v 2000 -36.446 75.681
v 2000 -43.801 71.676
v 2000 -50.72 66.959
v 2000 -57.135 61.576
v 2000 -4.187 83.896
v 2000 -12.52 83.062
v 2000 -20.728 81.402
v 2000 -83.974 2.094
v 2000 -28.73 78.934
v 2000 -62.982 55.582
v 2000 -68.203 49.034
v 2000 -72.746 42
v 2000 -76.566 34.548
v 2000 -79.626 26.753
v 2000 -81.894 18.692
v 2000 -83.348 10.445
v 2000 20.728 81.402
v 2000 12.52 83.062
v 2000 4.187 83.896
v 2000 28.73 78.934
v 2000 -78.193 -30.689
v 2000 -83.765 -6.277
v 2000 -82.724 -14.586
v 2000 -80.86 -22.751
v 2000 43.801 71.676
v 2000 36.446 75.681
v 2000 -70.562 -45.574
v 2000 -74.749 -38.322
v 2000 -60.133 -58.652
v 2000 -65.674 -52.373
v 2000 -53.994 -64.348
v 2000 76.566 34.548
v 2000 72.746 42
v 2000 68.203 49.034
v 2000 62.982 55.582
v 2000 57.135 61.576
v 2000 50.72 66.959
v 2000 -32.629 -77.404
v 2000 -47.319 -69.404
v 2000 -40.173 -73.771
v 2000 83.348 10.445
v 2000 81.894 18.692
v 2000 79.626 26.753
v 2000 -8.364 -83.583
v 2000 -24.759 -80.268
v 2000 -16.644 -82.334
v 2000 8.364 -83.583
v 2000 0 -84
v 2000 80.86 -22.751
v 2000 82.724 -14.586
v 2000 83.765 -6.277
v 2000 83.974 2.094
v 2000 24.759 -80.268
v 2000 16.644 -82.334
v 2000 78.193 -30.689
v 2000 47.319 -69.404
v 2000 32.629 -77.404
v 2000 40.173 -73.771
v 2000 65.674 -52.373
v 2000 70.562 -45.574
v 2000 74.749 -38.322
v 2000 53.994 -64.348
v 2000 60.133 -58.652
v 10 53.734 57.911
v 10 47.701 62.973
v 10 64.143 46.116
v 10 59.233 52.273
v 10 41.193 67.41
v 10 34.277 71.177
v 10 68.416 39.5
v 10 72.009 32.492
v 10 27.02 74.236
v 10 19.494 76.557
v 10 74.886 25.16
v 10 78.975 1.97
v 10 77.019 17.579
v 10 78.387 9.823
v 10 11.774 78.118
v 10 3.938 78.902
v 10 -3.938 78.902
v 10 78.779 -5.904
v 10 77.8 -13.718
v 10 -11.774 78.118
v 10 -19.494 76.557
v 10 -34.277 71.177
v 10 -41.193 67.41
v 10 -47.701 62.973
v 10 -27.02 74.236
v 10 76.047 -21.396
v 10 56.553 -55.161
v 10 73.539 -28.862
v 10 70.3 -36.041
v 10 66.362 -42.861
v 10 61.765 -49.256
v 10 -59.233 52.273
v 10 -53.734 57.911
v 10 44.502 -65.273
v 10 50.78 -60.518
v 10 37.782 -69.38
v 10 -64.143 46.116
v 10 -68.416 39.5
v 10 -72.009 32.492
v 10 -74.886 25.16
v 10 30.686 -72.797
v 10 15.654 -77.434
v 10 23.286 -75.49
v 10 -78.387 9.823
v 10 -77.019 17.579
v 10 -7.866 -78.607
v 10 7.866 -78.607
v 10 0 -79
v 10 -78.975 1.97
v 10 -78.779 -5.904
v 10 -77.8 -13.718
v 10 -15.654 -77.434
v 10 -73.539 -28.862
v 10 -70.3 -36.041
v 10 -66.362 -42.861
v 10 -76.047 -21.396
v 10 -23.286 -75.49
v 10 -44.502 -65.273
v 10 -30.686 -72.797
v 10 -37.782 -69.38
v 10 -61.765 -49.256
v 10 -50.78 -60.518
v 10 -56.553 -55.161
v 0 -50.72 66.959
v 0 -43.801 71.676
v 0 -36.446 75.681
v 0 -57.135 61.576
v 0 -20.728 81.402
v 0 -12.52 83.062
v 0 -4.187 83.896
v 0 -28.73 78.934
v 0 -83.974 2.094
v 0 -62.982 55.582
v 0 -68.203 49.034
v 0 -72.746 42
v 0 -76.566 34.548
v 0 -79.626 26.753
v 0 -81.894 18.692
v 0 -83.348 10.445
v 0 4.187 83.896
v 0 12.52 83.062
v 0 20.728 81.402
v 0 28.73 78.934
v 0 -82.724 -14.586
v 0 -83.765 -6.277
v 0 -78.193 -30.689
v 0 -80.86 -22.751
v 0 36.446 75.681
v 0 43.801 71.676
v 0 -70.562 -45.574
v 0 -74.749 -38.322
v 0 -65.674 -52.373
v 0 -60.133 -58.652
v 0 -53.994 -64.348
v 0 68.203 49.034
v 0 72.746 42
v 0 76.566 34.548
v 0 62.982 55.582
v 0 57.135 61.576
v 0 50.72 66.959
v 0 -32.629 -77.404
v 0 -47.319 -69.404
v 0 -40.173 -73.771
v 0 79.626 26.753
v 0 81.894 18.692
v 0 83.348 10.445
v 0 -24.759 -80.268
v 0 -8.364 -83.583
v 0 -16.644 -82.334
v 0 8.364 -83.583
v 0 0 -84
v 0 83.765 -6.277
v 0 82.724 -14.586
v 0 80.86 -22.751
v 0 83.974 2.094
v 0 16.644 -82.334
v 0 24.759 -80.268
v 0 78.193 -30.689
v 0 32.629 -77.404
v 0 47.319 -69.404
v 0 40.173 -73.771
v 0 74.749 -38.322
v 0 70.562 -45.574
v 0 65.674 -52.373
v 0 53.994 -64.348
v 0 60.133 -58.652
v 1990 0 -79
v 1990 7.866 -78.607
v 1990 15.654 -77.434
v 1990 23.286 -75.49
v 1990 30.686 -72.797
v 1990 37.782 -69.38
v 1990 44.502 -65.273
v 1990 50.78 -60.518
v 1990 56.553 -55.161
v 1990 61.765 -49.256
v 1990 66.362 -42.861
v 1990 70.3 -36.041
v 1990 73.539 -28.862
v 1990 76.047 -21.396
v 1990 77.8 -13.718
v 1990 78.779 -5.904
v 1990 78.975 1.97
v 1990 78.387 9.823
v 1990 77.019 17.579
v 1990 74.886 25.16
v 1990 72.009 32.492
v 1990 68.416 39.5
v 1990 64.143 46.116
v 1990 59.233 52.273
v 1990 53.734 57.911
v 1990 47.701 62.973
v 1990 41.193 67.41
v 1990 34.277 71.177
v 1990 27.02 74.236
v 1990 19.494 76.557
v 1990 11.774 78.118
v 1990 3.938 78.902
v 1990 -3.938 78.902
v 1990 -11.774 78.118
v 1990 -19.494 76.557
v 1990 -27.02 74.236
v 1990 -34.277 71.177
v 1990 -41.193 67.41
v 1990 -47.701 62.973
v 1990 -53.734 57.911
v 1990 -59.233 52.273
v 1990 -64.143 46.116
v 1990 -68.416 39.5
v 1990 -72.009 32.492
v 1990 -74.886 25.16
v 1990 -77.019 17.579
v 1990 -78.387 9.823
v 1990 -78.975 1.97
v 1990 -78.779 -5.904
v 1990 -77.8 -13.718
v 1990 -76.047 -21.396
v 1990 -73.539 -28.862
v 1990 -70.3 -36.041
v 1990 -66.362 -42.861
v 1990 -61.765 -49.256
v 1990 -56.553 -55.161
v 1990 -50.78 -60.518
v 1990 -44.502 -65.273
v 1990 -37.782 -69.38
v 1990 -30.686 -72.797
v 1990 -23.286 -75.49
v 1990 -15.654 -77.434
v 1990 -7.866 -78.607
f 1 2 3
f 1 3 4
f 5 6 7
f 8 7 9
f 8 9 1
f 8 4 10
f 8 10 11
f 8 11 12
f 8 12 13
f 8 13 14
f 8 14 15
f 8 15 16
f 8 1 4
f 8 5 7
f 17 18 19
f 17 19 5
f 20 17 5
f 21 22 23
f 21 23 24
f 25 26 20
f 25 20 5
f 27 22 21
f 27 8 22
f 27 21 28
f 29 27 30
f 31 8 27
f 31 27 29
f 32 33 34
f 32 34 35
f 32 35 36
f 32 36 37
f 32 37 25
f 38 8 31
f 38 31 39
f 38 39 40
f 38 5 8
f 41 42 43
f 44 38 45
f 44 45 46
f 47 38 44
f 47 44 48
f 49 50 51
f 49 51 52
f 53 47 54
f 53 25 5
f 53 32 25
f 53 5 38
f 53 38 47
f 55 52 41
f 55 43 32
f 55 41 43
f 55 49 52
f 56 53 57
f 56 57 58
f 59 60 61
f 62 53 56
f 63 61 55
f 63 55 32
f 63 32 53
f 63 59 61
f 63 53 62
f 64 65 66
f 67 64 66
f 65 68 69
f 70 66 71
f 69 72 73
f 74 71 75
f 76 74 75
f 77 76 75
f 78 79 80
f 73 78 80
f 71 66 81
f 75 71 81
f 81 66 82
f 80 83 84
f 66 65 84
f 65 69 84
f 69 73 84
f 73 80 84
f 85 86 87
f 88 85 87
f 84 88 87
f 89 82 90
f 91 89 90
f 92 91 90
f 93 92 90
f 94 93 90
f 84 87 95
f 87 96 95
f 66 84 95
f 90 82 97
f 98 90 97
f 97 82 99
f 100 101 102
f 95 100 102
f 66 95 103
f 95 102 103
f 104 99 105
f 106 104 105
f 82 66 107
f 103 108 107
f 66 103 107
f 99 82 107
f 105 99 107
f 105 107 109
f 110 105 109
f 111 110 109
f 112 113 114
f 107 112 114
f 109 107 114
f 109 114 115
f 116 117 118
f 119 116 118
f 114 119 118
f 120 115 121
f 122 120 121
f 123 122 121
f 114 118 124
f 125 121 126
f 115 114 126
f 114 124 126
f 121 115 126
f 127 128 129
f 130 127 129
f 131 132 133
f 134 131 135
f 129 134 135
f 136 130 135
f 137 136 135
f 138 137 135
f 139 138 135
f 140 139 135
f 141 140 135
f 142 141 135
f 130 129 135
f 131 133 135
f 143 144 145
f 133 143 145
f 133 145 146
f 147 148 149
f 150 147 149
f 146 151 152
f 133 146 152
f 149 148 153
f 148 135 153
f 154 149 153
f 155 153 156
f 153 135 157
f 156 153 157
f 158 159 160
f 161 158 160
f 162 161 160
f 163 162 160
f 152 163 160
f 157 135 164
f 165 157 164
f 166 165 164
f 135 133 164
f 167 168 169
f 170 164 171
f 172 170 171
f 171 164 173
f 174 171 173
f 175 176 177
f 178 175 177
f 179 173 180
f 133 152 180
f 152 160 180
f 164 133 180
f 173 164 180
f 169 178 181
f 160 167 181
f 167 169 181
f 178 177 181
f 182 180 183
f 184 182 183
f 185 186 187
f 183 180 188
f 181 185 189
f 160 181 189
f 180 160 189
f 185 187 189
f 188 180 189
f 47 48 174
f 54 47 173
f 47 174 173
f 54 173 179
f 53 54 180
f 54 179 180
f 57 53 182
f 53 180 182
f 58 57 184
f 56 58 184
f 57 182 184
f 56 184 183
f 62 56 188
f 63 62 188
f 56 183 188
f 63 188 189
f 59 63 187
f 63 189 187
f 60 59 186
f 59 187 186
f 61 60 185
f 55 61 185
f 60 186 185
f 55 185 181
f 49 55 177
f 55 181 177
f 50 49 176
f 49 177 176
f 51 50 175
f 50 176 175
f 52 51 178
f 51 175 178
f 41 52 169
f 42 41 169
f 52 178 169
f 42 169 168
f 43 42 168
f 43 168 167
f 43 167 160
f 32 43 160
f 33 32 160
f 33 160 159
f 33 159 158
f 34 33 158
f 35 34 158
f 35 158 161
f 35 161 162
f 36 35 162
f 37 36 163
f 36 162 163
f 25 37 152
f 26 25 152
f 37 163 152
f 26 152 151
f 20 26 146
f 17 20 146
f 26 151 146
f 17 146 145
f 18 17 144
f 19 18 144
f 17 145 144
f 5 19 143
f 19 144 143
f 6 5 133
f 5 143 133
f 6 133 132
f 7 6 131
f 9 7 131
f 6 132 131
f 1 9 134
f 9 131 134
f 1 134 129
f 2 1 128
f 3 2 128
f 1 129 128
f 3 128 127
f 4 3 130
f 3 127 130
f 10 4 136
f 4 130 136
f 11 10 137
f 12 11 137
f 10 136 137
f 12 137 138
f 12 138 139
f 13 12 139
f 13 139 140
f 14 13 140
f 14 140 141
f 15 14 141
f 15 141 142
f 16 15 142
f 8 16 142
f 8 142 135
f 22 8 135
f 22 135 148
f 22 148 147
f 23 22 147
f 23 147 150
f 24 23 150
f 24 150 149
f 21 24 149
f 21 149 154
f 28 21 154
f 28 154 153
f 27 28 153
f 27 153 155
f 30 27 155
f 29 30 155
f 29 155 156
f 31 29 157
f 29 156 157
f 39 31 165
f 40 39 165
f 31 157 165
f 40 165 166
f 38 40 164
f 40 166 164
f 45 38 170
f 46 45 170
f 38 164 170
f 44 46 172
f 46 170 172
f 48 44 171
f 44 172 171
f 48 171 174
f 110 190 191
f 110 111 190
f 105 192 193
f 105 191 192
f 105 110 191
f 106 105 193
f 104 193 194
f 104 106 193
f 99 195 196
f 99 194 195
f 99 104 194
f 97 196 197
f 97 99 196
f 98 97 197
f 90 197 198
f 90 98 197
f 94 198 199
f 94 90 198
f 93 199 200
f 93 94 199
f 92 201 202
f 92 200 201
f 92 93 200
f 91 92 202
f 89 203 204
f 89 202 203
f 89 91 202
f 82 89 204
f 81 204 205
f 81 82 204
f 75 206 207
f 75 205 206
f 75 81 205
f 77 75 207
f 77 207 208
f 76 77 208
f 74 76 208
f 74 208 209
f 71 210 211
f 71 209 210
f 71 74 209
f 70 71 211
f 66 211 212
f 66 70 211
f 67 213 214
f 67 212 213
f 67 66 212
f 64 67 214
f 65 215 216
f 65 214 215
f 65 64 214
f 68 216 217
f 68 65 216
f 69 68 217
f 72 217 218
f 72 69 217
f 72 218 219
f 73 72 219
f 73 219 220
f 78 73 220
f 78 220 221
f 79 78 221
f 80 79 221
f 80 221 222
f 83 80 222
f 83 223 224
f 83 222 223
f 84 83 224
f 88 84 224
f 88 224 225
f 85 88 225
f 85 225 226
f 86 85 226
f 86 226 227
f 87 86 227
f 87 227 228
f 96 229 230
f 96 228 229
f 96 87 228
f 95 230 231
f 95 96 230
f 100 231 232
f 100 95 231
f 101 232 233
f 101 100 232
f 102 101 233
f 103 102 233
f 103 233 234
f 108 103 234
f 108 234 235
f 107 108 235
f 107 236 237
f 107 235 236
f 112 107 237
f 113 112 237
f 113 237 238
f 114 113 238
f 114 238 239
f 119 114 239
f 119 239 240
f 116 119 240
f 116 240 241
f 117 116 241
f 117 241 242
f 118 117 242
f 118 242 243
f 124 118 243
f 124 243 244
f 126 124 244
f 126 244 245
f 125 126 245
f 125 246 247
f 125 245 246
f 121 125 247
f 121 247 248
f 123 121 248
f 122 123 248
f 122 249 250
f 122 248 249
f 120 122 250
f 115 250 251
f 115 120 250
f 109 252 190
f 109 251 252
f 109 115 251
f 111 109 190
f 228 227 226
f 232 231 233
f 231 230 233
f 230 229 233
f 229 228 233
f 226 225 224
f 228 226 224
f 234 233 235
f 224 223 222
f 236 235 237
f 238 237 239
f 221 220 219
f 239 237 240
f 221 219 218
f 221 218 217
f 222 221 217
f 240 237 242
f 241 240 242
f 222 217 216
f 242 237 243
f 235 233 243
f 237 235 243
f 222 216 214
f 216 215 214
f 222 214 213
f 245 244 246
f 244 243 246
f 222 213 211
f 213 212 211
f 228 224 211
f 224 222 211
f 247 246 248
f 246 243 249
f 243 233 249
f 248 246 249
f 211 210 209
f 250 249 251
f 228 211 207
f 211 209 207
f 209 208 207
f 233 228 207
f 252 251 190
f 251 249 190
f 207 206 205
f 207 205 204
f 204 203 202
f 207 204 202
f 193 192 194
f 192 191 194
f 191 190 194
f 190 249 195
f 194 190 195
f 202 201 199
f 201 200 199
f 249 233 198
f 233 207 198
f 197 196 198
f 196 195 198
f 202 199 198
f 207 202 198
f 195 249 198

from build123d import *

# Parameters (mm, degrees)
CROQUIS1_R              = 84
CROQUIS1_R_2            = 79
SALIENTE_EXTRUIR1_DEPTH = 2000
CROQUIS2_R              = 84
SALIENTE_EXTRUIR2_DEPTH = 10
SALIENTE_EXTRUIR3_START = -10
CROQUIS3_R              = 84
SALIENTE_EXTRUIR3_DEPTH = 10


with BuildPart() as part:
    # Croquis1 → Saliente-Extruir1 (new body)
    with BuildSketch(Plane(origin=(0, 0, 0), x_dir=(0, 0, -1), z_dir=(1, 0, 0))):
        Circle(CROQUIS1_R)
        Circle(CROQUIS1_R_2, mode=Mode.SUBTRACT)
    extrude(amount=SALIENTE_EXTRUIR1_DEPTH)

    # Croquis2 → Saliente-Extruir2 (add)
    with BuildSketch(Plane.ZY):
        with Locations(Location((0, 0, 0), (0, 0, 180))):
            Circle(CROQUIS2_R)
    extrude(amount=-SALIENTE_EXTRUIR2_DEPTH)

    # Croquis3 → Saliente-Extruir3 (add)
    with BuildSketch(Plane(origin=(2000, 0, 0), x_dir=(0, 0, -1), z_dir=(1, 0, 0)).offset(SALIENTE_EXTRUIR3_START)):
        Circle(CROQUIS3_R)
    extrude(amount=SALIENTE_EXTRUIR3_DEPTH)


solid = part.part
